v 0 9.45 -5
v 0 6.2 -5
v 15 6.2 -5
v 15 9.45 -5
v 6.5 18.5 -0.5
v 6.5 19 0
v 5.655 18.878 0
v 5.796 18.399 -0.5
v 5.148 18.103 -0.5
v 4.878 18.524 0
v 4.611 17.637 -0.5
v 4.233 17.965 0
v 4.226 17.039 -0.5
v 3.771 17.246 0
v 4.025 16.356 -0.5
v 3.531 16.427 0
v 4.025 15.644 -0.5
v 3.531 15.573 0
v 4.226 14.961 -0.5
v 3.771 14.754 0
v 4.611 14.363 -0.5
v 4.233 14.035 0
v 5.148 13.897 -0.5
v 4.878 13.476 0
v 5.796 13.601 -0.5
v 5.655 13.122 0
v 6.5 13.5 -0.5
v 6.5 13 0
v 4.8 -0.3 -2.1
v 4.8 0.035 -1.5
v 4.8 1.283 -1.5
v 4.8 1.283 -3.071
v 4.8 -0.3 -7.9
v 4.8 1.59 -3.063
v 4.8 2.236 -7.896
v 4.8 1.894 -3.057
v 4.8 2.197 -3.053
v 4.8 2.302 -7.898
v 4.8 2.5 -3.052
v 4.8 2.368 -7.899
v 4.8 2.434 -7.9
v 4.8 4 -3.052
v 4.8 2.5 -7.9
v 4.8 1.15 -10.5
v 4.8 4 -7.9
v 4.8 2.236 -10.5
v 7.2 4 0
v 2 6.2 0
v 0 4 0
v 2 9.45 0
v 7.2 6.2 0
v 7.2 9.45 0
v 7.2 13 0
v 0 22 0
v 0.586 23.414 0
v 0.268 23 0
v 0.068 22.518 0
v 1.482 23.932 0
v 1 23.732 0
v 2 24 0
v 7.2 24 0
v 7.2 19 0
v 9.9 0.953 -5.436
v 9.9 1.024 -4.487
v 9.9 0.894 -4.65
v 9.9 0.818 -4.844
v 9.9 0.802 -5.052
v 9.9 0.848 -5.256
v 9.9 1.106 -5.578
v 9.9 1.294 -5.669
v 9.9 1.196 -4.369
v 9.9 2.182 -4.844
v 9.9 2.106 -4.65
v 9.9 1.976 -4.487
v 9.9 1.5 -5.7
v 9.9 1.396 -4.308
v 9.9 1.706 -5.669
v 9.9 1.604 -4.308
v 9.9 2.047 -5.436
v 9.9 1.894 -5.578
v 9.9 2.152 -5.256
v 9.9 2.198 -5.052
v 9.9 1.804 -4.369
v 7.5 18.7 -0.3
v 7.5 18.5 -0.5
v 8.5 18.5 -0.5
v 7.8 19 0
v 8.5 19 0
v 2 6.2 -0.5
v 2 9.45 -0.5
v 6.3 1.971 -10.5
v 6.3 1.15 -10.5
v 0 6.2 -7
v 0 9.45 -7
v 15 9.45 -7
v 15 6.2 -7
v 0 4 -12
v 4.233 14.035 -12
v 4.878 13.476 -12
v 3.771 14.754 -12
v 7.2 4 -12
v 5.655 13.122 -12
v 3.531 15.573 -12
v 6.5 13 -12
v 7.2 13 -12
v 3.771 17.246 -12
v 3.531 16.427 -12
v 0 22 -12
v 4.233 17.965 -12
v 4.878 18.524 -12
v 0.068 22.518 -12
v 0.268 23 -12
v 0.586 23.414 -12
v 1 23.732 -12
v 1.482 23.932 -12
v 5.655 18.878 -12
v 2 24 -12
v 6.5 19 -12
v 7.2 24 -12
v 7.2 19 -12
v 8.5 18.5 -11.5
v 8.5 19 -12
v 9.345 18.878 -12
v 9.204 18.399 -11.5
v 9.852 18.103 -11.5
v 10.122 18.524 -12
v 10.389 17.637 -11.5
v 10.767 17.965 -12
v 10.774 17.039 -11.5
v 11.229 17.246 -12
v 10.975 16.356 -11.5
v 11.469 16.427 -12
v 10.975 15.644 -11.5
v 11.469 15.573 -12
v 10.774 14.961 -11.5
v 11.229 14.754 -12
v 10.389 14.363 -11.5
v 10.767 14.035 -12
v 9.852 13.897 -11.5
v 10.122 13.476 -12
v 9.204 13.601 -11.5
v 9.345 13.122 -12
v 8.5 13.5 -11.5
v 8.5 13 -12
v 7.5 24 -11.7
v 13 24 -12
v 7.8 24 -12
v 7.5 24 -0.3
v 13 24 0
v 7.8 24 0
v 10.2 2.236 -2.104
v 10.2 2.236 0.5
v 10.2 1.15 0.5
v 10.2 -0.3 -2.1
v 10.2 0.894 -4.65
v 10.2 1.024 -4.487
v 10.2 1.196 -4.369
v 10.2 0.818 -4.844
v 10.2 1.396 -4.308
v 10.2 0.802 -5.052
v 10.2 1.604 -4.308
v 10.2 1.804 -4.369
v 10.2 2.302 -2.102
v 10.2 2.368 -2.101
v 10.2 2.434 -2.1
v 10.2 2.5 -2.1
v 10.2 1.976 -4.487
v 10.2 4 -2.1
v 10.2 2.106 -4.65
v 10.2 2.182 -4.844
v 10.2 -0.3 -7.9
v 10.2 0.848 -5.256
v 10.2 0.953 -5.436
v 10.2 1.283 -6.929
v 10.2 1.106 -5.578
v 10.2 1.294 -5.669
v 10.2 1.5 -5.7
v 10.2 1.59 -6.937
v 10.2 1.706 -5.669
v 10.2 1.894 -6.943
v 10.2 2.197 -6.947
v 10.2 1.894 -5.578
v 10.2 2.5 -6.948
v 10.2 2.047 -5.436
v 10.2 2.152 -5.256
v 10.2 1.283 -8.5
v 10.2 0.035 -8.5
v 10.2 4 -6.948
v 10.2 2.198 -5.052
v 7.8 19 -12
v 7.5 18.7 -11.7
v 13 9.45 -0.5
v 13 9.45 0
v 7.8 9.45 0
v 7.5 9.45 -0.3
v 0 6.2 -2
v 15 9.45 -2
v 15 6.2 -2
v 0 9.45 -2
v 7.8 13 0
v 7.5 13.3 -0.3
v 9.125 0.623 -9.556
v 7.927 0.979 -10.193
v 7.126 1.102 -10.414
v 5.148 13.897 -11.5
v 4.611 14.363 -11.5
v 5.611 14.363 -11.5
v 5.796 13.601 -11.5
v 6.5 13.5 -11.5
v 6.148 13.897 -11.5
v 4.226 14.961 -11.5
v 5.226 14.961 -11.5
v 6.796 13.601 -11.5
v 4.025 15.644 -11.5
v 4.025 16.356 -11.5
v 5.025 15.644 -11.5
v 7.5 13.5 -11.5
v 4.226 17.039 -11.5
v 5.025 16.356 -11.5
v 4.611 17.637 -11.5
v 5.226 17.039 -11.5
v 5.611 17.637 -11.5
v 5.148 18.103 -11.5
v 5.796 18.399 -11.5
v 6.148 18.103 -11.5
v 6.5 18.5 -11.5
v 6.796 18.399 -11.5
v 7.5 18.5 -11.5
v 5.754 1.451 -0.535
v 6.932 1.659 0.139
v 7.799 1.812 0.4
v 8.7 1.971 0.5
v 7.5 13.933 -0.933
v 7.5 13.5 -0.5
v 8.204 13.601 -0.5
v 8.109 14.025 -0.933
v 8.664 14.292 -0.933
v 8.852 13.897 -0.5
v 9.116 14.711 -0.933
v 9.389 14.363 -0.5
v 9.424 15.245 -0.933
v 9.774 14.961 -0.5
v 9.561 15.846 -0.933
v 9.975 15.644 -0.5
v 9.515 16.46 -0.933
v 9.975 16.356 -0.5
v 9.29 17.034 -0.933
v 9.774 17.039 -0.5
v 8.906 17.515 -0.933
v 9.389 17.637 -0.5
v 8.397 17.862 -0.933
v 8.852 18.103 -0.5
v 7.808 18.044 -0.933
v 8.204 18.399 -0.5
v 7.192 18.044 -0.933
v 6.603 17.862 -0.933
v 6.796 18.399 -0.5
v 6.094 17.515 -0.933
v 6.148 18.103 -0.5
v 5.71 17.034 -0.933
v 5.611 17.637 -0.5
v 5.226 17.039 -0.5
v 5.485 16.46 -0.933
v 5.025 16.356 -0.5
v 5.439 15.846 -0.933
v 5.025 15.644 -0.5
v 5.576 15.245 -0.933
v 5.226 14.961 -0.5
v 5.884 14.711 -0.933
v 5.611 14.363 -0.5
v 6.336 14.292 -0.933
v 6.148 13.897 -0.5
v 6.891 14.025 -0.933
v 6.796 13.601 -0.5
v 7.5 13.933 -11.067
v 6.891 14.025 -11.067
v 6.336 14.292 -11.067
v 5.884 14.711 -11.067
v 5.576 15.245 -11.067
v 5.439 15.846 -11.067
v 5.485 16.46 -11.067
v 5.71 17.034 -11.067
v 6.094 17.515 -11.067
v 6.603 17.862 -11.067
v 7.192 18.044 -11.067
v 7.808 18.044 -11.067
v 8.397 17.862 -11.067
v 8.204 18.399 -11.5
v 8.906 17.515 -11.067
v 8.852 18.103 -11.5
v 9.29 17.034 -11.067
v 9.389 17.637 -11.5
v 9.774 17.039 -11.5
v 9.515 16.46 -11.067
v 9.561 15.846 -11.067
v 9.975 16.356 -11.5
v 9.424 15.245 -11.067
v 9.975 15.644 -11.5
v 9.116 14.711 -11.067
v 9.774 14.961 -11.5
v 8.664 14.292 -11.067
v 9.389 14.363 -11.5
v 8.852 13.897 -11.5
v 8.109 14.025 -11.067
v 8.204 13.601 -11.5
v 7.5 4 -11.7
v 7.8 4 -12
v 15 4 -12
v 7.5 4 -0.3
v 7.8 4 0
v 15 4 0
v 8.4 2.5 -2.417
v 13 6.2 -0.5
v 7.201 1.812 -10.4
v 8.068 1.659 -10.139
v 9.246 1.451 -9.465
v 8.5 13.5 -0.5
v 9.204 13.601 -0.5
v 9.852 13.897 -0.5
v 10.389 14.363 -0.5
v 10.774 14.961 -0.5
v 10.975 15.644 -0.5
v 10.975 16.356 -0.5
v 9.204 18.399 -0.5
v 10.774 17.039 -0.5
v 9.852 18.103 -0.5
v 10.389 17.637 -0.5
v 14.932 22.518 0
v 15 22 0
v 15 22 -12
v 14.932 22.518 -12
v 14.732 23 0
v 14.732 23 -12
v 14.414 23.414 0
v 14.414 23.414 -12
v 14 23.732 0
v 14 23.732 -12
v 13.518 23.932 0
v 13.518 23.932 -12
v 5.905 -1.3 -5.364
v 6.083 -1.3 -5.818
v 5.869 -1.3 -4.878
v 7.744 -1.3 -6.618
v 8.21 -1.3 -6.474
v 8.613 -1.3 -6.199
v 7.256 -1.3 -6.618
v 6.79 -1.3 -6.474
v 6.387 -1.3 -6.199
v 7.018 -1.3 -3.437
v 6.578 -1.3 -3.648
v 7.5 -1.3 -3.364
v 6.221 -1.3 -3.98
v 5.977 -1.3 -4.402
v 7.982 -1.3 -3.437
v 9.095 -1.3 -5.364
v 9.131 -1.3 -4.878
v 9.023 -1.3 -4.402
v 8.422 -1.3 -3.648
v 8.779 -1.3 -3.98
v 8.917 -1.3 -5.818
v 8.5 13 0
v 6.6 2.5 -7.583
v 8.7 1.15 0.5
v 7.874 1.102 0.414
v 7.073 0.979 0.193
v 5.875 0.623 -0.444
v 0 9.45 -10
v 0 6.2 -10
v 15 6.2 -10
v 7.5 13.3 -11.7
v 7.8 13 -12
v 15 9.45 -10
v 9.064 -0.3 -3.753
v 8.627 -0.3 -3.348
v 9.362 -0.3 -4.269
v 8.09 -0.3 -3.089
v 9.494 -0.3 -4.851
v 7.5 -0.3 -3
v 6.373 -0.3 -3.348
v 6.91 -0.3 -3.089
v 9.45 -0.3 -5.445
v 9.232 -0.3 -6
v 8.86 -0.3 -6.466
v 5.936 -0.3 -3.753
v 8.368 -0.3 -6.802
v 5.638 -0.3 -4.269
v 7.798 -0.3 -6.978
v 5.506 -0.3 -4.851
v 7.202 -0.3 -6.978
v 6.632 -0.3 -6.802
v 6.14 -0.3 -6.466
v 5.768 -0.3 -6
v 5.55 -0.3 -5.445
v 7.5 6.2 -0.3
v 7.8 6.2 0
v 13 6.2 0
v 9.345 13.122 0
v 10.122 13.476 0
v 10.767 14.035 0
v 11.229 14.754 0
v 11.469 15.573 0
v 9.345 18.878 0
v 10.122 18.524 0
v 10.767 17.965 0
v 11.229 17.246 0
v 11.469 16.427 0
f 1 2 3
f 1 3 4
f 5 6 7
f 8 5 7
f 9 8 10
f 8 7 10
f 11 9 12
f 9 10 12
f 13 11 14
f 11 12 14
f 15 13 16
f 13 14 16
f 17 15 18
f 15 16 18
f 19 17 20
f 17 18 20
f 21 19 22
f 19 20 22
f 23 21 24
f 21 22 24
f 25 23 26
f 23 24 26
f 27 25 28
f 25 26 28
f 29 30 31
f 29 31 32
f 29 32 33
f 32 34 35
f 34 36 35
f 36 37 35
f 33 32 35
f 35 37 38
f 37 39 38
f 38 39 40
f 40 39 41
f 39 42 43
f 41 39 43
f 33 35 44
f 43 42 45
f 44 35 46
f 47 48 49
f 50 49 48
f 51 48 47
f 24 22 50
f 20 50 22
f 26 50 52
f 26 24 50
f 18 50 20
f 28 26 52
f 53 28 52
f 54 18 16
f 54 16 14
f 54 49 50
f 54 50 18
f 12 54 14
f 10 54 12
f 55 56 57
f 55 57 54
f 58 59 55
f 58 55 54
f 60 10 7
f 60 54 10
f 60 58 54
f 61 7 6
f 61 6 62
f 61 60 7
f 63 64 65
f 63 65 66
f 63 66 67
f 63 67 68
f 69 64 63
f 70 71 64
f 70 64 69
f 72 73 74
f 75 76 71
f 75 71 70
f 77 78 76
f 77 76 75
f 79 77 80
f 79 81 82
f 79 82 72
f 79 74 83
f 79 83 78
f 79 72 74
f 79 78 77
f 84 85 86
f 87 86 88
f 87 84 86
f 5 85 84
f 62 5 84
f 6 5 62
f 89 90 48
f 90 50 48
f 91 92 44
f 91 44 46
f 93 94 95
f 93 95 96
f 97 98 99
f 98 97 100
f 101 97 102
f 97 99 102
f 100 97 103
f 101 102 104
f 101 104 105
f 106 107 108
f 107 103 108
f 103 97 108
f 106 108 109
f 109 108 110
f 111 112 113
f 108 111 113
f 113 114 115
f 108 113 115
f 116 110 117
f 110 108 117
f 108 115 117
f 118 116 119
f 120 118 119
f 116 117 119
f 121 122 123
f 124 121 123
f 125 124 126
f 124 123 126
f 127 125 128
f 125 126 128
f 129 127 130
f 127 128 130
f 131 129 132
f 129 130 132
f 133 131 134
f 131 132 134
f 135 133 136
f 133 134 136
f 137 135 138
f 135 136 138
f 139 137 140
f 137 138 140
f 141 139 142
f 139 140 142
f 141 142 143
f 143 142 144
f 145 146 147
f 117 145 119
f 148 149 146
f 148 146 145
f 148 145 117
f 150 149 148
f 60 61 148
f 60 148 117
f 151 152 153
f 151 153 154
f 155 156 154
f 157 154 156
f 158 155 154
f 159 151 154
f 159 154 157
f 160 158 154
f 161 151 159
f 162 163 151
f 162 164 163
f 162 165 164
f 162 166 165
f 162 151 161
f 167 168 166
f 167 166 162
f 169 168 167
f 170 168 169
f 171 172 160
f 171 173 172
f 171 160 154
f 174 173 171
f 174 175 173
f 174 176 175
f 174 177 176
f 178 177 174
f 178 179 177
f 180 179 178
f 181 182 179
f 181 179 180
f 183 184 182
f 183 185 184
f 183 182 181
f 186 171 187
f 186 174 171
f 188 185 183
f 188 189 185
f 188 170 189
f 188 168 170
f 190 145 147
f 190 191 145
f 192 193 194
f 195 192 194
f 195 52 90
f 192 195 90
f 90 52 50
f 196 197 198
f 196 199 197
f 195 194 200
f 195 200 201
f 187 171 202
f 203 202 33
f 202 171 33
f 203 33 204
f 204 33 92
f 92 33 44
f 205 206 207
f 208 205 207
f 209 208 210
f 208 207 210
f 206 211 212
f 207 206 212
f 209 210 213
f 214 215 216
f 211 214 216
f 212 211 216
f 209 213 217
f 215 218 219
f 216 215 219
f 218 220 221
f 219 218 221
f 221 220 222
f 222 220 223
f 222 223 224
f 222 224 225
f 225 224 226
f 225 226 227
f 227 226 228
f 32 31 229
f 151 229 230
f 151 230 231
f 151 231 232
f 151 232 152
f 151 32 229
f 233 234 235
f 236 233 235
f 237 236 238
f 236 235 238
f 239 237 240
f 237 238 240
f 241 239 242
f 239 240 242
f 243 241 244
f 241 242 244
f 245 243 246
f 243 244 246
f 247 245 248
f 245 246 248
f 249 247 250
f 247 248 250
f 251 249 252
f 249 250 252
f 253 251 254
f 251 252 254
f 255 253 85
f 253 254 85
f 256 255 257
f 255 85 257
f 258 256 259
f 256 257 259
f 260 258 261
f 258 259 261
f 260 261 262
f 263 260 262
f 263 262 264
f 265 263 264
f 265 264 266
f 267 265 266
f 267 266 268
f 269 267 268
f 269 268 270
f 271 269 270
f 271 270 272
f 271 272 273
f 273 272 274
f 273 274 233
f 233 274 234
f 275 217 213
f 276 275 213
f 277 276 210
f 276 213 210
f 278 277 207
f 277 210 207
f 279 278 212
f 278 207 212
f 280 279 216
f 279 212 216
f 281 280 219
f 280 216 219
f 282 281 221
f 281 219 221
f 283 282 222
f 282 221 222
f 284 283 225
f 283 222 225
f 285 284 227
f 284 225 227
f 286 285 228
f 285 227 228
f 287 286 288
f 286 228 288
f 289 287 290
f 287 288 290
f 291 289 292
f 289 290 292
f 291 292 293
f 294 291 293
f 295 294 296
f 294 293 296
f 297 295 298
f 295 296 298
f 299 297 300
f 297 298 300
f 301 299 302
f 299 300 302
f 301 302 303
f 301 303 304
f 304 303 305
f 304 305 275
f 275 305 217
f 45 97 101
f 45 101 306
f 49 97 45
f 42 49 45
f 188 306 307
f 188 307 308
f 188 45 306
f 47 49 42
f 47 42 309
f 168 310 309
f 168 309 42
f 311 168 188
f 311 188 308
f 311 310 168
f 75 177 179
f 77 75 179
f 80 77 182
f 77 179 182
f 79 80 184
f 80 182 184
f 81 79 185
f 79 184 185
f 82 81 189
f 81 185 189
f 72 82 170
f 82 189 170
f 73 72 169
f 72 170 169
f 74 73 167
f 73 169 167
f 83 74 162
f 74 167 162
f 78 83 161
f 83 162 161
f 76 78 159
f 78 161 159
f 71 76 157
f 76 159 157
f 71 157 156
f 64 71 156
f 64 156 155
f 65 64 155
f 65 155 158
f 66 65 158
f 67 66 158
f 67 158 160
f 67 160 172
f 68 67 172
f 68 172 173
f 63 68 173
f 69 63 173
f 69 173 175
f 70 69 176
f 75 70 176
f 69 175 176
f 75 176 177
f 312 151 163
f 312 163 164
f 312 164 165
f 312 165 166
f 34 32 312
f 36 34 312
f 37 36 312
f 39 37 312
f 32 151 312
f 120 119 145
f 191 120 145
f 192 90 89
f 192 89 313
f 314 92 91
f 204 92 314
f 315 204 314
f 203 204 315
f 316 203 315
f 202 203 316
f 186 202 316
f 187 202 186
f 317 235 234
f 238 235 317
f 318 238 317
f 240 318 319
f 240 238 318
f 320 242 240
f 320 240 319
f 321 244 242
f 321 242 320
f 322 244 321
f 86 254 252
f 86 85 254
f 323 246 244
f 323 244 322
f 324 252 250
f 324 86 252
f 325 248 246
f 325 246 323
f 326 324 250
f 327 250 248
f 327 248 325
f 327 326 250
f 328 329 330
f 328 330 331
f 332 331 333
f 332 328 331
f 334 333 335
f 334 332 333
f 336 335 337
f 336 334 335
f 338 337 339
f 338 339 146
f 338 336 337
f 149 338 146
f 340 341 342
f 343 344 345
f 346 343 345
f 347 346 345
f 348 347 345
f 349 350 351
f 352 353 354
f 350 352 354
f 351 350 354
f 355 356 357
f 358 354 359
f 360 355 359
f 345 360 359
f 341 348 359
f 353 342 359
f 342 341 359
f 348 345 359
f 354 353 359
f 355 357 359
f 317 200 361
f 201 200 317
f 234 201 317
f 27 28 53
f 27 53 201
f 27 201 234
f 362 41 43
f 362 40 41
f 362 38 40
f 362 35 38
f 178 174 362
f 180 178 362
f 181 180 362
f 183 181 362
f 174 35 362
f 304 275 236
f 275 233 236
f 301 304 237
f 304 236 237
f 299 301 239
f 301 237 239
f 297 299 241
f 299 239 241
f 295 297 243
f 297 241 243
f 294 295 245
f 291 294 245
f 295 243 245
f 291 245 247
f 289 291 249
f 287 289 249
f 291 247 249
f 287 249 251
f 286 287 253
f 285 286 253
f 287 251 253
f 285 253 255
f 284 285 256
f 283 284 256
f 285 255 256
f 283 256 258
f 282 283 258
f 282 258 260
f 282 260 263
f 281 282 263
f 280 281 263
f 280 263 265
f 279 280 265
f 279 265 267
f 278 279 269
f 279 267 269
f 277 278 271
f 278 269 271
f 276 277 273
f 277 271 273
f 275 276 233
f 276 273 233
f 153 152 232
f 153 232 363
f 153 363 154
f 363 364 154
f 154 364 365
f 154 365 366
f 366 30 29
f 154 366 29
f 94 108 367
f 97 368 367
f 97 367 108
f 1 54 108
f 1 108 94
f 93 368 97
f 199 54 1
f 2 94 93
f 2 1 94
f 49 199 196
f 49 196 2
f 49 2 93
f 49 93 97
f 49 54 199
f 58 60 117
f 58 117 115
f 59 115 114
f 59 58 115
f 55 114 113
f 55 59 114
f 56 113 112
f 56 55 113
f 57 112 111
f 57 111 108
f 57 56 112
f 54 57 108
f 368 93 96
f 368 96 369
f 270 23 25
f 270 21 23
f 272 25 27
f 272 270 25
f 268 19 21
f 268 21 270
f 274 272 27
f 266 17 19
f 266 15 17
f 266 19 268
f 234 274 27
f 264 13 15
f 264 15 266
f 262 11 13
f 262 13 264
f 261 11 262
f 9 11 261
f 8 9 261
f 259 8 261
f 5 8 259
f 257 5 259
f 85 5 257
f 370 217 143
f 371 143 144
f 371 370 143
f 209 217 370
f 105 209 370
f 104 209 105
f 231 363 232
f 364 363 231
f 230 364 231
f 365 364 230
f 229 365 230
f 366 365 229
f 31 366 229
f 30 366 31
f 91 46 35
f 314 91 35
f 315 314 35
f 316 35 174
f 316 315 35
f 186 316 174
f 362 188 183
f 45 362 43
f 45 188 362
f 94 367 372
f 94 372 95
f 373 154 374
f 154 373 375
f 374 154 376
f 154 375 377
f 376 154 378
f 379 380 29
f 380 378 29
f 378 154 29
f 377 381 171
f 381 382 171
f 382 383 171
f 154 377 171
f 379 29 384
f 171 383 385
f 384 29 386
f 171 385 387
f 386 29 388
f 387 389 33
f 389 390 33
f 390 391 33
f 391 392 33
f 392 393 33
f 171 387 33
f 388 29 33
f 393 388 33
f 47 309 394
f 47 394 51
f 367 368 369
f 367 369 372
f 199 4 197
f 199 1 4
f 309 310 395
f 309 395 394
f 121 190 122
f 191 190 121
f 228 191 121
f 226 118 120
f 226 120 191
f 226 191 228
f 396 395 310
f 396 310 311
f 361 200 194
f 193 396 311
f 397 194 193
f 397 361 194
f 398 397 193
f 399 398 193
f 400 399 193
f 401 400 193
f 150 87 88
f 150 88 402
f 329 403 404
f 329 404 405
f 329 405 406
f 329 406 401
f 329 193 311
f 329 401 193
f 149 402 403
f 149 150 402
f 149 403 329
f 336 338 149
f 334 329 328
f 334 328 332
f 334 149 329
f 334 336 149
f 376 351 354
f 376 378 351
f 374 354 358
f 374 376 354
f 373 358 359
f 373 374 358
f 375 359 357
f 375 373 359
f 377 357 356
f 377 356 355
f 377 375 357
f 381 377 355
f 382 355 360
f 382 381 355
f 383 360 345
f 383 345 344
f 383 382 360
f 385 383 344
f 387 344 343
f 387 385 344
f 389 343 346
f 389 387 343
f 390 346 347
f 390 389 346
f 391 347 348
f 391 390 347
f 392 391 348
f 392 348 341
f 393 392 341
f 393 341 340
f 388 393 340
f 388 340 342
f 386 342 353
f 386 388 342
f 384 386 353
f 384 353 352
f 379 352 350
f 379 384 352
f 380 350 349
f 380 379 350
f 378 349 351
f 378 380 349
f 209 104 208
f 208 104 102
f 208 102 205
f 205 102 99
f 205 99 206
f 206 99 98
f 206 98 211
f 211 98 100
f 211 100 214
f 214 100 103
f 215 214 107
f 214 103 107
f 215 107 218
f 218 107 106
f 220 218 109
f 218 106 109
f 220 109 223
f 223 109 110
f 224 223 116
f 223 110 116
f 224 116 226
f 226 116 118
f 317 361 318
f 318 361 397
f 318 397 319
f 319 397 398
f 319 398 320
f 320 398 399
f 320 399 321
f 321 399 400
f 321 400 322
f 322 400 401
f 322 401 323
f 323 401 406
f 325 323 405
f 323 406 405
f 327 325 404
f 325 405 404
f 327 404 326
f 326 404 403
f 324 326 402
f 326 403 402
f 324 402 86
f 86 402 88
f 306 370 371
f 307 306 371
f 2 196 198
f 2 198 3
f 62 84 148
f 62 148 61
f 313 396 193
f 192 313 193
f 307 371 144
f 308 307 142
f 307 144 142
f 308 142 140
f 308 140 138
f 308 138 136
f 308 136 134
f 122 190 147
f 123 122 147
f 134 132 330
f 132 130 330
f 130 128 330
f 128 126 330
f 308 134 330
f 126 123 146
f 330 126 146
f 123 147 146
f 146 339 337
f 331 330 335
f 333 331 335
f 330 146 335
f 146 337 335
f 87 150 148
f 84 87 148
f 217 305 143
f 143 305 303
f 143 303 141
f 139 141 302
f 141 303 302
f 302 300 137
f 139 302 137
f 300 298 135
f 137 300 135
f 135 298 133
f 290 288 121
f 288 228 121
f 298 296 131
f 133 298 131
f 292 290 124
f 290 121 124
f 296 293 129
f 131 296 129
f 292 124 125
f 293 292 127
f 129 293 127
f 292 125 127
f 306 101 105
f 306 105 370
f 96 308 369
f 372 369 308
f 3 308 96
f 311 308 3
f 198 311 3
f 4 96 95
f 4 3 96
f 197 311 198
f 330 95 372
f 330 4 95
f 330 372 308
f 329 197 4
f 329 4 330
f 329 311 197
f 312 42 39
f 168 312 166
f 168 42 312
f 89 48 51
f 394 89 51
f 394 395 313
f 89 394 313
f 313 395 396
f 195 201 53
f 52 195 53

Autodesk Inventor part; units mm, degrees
ref_plane "YZ Plane" through (0, 0, 0) normal (1, 0, 0) x (0, 1, 0)
ref_plane "XZ Plane" through (0, 0, 0) normal (0, 1, 0) x (-1, 0, 0)
ref_plane "XY Plane" through (0, 0, 0) normal (0, 0, 1) x (1, 0, 0)
sketch "Sketch_1" plane through (0, 0, 0) normal (0, 0, 1) x (1, 0, 0)
  line L0 (0, 22) -> (0, 4)
  line L1 (0, 4) -> (15, 4)
  line L2 (15, 4) -> (15, 22)
  arc A0 (15, 22) -> (13, 24) centre (13, 22) ccw
  line L3 (13, 24) -> (2, 24)
  arc A1 (2, 24) -> (0, 22) centre (2, 22) ccw
extrude "Extrusion1" add sketch "Sketch_1" against normal blind 12
sketch "Sketch_8" plane through (6.5, 0, 0) normal (1, 0, 0) x (0, 0, -1)
  line L0 (0, 16) -> (12, 16)
  line L1 (12, 16) -> (12, 13)
  line L2 (12, 13) -> (11.5, 13.5)
  line L3 (11.5, 13.5) -> (0.5, 13.5)
  line L4 (0.5, 13.5) -> (0, 13)
  line L5 (0, 13) -> (0, 16)
  line L6 (0, 16) -> (12, 16)
revolve "Revolution1" cut sketch "Sketch_8" angle 360 about axis through (6.5, 16, 0) along (0, 0, 1)
sketch "Sketch_9" plane through (8.5, 0, 0) normal (1, 0, 0) x (0, 0, -1)
  line L0 (0, 16) -> (12, 16)
  line L1 (12, 16) -> (12, 13)
  line L2 (12, 13) -> (11.5, 13.5)
  line L3 (11.5, 13.5) -> (0.5, 13.5)
  line L4 (0.5, 13.5) -> (0, 13)
  line L5 (0, 13) -> (0, 16)
  line L6 (0, 16) -> (12, 16)
revolve "Revolution2" cut sketch "Sketch_9" angle 360 about axis through (8.5, 16, 0) along (0, 0, 1)
sketch "Sketch_10" plane through (6.5, 0, 0) normal (1, 0, 0) x (0, 0, -1)
  line L0 (0, 13) -> (0.5, 13.5)
  line L1 (0.5, 13.5) -> (11.5, 13.5)
  line L2 (11.5, 13.5) -> (12, 13)
  line L3 (12, 13) -> (12, 19)
  line L4 (12, 19) -> (11.5, 18.5)
  line L5 (11.5, 18.5) -> (0.5, 18.5)
  line L6 (0.5, 18.5) -> (0, 19)
  line L7 (0, 19) -> (0, 13)
extrude "Extrusion2" cut sketch "Sketch_10" along normal blind 2
sketch "Sketch_7" plane through (7.5, 0, 0) normal (1, 0, 0) x (0, 0, -1)
  line L0 (-0.5, 1.15) -> (2.1, -0.3)
  line L1 (2.1, -0.3) -> (7.9, -0.3)
  line L2 (7.9, -0.3) -> (10.5, 1.15)
  line L3 (10.5, 1.15) -> (10.5, 2.5)
  line L4 (10.5, 2.5) -> (7.9, 2.5)
  line L5 (7.9, 2.5) -> (7.9, 4)
  line L6 (7.9, 4) -> (2.1, 4)
  line L7 (2.1, 4) -> (2.1, 2.5)
  line L8 (2.1, 2.5) -> (-0.5, 2.5)
  line L9 (-0.5, 2.5) -> (-0.5, 1.15)
sketch "Sketch_3" plane through (0, 0, 0) normal (1, 0, 0) x (0, 1, 0)
  line L0 (6.2, -2) -> (6.2, -5)
  line L1 (6.2, -5) -> (9.45, -5)
  line L2 (9.45, -5) -> (9.45, -2)
  line L3 (9.45, -2) -> (6.2, -2)
sketch "Sketch_5" plane through (0, 0, 0) normal (1, 0, 0) x (0, 1, 0)
  line L0 (6.2, -7) -> (6.2, -10)
  line L1 (6.2, -10) -> (9.45, -10)
  line L2 (9.45, -10) -> (9.45, -7)
  line L3 (9.45, -7) -> (6.2, -7)
extrude "Extrusion3" cut sketch "Sketch_3" along normal blind 15
extrude "Extrusion4" cut sketch "Sketch_5" along normal blind 15
sketch "Sketch_6" plane through (0, 0, 0) normal (0, 0, 1) x (1, 0, 0)
  line L0 (2, 6.2) -> (13, 6.2)
  line L1 (13, 6.2) -> (13, 9.45)
  line L2 (13, 9.45) -> (2, 9.45)
  line L3 (2, 9.45) -> (2, 6.2)
extrude "Extrusion5" cut sketch "Sketch_6" against normal blind 0.5
sketch "Sketch_11" plane through (0, 0, 0) normal (0, 1, 0) x (-1, 0, 0)
  line L0 (-7.2, 0) -> (-7.8, 0)
  line L1 (-7.8, 0) -> (-7.5, -0.3)
  line L2 (-7.5, -0.3) -> (-7.2, 0)
extrude "Extrusion6" cut sketch "Sketch_11" along normal blind 25
sketch "Sketch_12" plane through (0, 0, 0) normal (0, 1, 0) x (-1, 0, 0)
  line L0 (-7.2, -12) -> (-7.5, -11.7)
  line L1 (-7.5, -11.7) -> (-7.8, -12)
  line L2 (-7.8, -12) -> (-7.2, -12)
extrude "Extrusion7" cut sketch "Sketch_12" along normal blind 25
extrude "Extrusion8" add sketch "Sketch_7" along normal mid plane 5.4
sketch "Sketch_2" plane through (7.5, 0, 0) normal (1, 0, 0) x (0, 0, -1)
  line L0 (5, -0.3) -> (5, -1.3)
  line L1 (5, -1.3) -> (3.364, -1.3)
  line L2 (3.364, -1.3) -> (3, -0.3)
  line L3 (3, -0.3) -> (5, -0.3)
  line L4 (5, -0.3) -> (5, -1.3)
revolve "Revolution3" add sketch "Sketch_2" angle 360 about axis through (7.5, -0.3, -5) along (0, 1, 0)
sketch "Sketch_4" plane through (0, 0, 0) normal (0, 1, 0) x (-1, 0, 0)
  line L0 (-3.8, 1.5) -> (-10.2, 1.5)
  line L1 (-10.2, 1.5) -> (-10.2, 0.5)
  line L2 (-10.2, 0.5) -> (-8.7, 0.5)
  arc A0 (-4.8, -1.5) -> (-8.7, 0.5) centre (-8.8008, -4.499) ccw
  line L3 (-4.8, -1.5) -> (-3.8, -1.5)
  line L4 (-3.8, -1.5) -> (-3.8, 1.5)
extrude "Extrusion9" cut sketch "Sketch_4" along normal blind 3
sketch "Sketch_13" plane through (0, 0, 0) normal (0, 1, 0) x (-1, 0, 0)
  line L0 (-4.8, -10.5) -> (-6.3, -10.5)
  arc A0 (-10.2, -8.5) -> (-6.3, -10.5) centre (-6.1992, -5.501) ccw
  line L1 (-10.2, -8.5) -> (-11.2, -8.5)
  line L2 (-11.2, -8.5) -> (-11.2, -11.5)
  line L3 (-11.2, -11.5) -> (-4.8, -11.5)
  line L4 (-4.8, -11.5) -> (-4.8, -10.5)
extrude "Extrusion10" cut sketch "Sketch_13" along normal blind 3
sketch "Sketch_14" plane through (10.2, 0, 0) normal (1, 0, 0) x (0, 0, -1)
  circle A0 centre (5, 1.5) radius 0.7
extrude "Extrusion11" cut sketch "Sketch_14" against normal blind 0.3
sketch "Sketch_15" plane through (0, 0, -0.5) normal (0, 0, 1) x (1, 0, 0)
  arc A0 (6.5, 18.5) -> (6.5, 13.5) centre (6.5, 16) ccw
  line L0 (6.5, 13.5) -> (8.5, 13.5)
  arc A1 (8.5, 13.5) -> (8.5, 18.5) centre (8.5, 16) ccw
  line L1 (8.5, 18.5) -> (6.5, 18.5)
extrude "Extrusion12" add sketch "Sketch_15" against normal blind 11
sketch "Sketch_16" plane through (7.5, 0, 0) normal (1, 0, 0) x (0, 0, -1)
  line L0 (0.5, 16) -> (11.5, 16)
  line L1 (11.5, 16) -> (11.5, 13.5)
  line L2 (11.5, 13.5) -> (11.067, 13.933)
  line L3 (11.067, 13.933) -> (0.933, 13.933)
  line L4 (0.933, 13.933) -> (0.5, 13.5)
  line L5 (0.5, 13.5) -> (0.5, 16)
  line L6 (0.5, 16) -> (11.5, 16)
revolve "Revolution4" cut sketch "Sketch_16" angle 360 about axis through (7.5, 16, -0.5) along (0, 0, 1)
thread "Thread1" size "M5x0.8" class "6H" standard "ISO Metric profile" full length
sketch "Sketch_17" plane through (0, 4, 0) normal (0, 1, 0) x (1, 0, 0)
  line L0 (2, 10) -> (2, 0)
  line L1 (2, 0) -> (12, 0)
  line L2 (12, 0) -> (12, 10)
  line L3 (12, 10) -> (2, 10)
  line L4 (4.8, 3.0522) -> (10.2, 2.1)
  line L5 (10.2, 2.1) -> (10.2, 6.9478)
  line L6 (10.2, 6.9478) -> (4.8, 7.9)
  line L7 (4.8, 7.9) -> (4.8, 3.0522)
extrude "Extrusion13" cut sketch "Sketch_17" against normal blind 1.5
sketch "Sketch_18" plane through (0, 2.5, 0) normal (0, 1, 0) x (1, 0, 0)
  line L0 (11.7, 15) -> (11.7, -5)
  line L1 (2.8, 3.4048) -> (2.8, -5)
  line L2 (2.8, -5) -> (11.2, -5)
  line L3 (11.2, -5) -> (11.2, 1.9237)
  line L4 (11.2, 1.9237) -> (2.8, 3.4048)
revolve "Revolution5" cut sketch "Sketch_18" angle 10 about axis through (11.7, 2.5, -15) along (0, 0, 1)
sketch "Sketch_19" plane through (0, 2.5, 0) normal (0, 1, 0) x (1, 0, 0)
  line L0 (3.3, -5) -> (3.3, 15)
  line L1 (3.8, 8.0763) -> (12.2, 6.5952)
  line L2 (12.2, 6.5952) -> (12.2, 15)
  line L3 (12.2, 15) -> (3.8, 15)
  line L4 (3.8, 15) -> (3.8, 8.0763)
revolve "Revolution6" cut sketch "Sketch_19" angle 10 about axis through (3.3, 2.5, 5) along (0, 0, -1)
properties part number "HCBR5"
